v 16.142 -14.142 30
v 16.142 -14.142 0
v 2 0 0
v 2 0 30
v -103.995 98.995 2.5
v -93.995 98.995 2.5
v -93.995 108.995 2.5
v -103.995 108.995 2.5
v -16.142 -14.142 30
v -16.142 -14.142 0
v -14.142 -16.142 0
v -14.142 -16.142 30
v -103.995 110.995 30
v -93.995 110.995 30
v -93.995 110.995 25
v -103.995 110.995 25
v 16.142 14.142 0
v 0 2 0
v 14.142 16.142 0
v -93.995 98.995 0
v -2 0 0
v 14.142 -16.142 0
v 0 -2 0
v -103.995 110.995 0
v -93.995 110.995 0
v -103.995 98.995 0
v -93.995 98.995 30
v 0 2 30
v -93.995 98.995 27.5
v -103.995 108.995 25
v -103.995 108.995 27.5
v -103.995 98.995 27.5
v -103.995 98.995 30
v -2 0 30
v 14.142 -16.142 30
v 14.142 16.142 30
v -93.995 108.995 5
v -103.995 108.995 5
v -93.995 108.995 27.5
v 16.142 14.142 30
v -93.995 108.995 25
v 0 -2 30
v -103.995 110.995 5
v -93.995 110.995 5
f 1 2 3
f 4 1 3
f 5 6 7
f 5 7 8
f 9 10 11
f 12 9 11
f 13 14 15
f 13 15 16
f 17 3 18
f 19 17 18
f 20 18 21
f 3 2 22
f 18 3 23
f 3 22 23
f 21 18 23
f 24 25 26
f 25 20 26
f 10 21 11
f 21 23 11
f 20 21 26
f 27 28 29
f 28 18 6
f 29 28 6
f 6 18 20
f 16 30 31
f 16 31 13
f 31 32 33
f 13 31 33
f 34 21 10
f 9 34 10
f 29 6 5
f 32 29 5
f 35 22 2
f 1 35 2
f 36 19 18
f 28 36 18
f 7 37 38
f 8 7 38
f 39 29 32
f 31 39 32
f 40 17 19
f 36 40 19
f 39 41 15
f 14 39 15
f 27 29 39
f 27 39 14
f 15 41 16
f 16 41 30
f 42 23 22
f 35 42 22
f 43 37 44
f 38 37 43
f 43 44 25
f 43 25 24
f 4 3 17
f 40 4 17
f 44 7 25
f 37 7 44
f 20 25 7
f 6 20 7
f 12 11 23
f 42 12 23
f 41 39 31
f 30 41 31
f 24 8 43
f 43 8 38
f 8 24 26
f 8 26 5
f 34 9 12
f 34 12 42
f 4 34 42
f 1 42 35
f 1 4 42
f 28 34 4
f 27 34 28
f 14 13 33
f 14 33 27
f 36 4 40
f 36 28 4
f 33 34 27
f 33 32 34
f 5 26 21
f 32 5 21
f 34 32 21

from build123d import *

# Parameters (mm, degrees)
F1_DEPTH = 30
F2_W     = 10
F2_H     = 2.5
F3_DEPTH = 10
F4_W     = 10
F4_H     = 5
F5_W     = 10
F5_H     = 5
F6_DEPTH = 2


with BuildPart() as f1:
    # F0 (on Top) → F1 (new body)
    with BuildSketch(Plane.XY):
        Polygon((-93.994949, 98.994949), (-103.994949, 98.994949), (-2, 0), (-16.142136, -14.142136), (-14.142136, -16.142136), (0, -2), (14.142136, -16.142136), (16.142136, -14.142136), (2, 0), (16.142136, 14.142136), (14.142136, 16.142136), (0, 2), align=None)
    extrude(amount=F1_DEPTH)

    # F2 (on face) → F3 (join)
    with BuildSketch(Plane(origin=(0, 98.994949, 0), x_dir=(-1, 0, 0), z_dir=(0, 1, 0))):
        with Locations((98.994949, 1.25)):
            Rectangle(F2_W, F2_H)
        with Locations((98.994949, 28.75)):
            Rectangle(F2_W, F2_H)
    extrude(amount=F3_DEPTH)

    # F4 (on face) + F5 (on face) → F6 (join)
    with BuildSketch(Plane(origin=(0, 108.994949, 0), x_dir=(-1, 0, 0), z_dir=(0, 1, 0))):
        with Locations((98.994949, 2.5)):
            Rectangle(F4_W, F4_H)
    with BuildSketch(Plane(origin=(0, 108.994949, 0), x_dir=(-1, 0, 0), z_dir=(0, 1, 0))):
        with Locations((98.994949, 27.5)):
            Rectangle(F5_W, F5_H)
    extrude(amount=F6_DEPTH)


solid = f1.part
